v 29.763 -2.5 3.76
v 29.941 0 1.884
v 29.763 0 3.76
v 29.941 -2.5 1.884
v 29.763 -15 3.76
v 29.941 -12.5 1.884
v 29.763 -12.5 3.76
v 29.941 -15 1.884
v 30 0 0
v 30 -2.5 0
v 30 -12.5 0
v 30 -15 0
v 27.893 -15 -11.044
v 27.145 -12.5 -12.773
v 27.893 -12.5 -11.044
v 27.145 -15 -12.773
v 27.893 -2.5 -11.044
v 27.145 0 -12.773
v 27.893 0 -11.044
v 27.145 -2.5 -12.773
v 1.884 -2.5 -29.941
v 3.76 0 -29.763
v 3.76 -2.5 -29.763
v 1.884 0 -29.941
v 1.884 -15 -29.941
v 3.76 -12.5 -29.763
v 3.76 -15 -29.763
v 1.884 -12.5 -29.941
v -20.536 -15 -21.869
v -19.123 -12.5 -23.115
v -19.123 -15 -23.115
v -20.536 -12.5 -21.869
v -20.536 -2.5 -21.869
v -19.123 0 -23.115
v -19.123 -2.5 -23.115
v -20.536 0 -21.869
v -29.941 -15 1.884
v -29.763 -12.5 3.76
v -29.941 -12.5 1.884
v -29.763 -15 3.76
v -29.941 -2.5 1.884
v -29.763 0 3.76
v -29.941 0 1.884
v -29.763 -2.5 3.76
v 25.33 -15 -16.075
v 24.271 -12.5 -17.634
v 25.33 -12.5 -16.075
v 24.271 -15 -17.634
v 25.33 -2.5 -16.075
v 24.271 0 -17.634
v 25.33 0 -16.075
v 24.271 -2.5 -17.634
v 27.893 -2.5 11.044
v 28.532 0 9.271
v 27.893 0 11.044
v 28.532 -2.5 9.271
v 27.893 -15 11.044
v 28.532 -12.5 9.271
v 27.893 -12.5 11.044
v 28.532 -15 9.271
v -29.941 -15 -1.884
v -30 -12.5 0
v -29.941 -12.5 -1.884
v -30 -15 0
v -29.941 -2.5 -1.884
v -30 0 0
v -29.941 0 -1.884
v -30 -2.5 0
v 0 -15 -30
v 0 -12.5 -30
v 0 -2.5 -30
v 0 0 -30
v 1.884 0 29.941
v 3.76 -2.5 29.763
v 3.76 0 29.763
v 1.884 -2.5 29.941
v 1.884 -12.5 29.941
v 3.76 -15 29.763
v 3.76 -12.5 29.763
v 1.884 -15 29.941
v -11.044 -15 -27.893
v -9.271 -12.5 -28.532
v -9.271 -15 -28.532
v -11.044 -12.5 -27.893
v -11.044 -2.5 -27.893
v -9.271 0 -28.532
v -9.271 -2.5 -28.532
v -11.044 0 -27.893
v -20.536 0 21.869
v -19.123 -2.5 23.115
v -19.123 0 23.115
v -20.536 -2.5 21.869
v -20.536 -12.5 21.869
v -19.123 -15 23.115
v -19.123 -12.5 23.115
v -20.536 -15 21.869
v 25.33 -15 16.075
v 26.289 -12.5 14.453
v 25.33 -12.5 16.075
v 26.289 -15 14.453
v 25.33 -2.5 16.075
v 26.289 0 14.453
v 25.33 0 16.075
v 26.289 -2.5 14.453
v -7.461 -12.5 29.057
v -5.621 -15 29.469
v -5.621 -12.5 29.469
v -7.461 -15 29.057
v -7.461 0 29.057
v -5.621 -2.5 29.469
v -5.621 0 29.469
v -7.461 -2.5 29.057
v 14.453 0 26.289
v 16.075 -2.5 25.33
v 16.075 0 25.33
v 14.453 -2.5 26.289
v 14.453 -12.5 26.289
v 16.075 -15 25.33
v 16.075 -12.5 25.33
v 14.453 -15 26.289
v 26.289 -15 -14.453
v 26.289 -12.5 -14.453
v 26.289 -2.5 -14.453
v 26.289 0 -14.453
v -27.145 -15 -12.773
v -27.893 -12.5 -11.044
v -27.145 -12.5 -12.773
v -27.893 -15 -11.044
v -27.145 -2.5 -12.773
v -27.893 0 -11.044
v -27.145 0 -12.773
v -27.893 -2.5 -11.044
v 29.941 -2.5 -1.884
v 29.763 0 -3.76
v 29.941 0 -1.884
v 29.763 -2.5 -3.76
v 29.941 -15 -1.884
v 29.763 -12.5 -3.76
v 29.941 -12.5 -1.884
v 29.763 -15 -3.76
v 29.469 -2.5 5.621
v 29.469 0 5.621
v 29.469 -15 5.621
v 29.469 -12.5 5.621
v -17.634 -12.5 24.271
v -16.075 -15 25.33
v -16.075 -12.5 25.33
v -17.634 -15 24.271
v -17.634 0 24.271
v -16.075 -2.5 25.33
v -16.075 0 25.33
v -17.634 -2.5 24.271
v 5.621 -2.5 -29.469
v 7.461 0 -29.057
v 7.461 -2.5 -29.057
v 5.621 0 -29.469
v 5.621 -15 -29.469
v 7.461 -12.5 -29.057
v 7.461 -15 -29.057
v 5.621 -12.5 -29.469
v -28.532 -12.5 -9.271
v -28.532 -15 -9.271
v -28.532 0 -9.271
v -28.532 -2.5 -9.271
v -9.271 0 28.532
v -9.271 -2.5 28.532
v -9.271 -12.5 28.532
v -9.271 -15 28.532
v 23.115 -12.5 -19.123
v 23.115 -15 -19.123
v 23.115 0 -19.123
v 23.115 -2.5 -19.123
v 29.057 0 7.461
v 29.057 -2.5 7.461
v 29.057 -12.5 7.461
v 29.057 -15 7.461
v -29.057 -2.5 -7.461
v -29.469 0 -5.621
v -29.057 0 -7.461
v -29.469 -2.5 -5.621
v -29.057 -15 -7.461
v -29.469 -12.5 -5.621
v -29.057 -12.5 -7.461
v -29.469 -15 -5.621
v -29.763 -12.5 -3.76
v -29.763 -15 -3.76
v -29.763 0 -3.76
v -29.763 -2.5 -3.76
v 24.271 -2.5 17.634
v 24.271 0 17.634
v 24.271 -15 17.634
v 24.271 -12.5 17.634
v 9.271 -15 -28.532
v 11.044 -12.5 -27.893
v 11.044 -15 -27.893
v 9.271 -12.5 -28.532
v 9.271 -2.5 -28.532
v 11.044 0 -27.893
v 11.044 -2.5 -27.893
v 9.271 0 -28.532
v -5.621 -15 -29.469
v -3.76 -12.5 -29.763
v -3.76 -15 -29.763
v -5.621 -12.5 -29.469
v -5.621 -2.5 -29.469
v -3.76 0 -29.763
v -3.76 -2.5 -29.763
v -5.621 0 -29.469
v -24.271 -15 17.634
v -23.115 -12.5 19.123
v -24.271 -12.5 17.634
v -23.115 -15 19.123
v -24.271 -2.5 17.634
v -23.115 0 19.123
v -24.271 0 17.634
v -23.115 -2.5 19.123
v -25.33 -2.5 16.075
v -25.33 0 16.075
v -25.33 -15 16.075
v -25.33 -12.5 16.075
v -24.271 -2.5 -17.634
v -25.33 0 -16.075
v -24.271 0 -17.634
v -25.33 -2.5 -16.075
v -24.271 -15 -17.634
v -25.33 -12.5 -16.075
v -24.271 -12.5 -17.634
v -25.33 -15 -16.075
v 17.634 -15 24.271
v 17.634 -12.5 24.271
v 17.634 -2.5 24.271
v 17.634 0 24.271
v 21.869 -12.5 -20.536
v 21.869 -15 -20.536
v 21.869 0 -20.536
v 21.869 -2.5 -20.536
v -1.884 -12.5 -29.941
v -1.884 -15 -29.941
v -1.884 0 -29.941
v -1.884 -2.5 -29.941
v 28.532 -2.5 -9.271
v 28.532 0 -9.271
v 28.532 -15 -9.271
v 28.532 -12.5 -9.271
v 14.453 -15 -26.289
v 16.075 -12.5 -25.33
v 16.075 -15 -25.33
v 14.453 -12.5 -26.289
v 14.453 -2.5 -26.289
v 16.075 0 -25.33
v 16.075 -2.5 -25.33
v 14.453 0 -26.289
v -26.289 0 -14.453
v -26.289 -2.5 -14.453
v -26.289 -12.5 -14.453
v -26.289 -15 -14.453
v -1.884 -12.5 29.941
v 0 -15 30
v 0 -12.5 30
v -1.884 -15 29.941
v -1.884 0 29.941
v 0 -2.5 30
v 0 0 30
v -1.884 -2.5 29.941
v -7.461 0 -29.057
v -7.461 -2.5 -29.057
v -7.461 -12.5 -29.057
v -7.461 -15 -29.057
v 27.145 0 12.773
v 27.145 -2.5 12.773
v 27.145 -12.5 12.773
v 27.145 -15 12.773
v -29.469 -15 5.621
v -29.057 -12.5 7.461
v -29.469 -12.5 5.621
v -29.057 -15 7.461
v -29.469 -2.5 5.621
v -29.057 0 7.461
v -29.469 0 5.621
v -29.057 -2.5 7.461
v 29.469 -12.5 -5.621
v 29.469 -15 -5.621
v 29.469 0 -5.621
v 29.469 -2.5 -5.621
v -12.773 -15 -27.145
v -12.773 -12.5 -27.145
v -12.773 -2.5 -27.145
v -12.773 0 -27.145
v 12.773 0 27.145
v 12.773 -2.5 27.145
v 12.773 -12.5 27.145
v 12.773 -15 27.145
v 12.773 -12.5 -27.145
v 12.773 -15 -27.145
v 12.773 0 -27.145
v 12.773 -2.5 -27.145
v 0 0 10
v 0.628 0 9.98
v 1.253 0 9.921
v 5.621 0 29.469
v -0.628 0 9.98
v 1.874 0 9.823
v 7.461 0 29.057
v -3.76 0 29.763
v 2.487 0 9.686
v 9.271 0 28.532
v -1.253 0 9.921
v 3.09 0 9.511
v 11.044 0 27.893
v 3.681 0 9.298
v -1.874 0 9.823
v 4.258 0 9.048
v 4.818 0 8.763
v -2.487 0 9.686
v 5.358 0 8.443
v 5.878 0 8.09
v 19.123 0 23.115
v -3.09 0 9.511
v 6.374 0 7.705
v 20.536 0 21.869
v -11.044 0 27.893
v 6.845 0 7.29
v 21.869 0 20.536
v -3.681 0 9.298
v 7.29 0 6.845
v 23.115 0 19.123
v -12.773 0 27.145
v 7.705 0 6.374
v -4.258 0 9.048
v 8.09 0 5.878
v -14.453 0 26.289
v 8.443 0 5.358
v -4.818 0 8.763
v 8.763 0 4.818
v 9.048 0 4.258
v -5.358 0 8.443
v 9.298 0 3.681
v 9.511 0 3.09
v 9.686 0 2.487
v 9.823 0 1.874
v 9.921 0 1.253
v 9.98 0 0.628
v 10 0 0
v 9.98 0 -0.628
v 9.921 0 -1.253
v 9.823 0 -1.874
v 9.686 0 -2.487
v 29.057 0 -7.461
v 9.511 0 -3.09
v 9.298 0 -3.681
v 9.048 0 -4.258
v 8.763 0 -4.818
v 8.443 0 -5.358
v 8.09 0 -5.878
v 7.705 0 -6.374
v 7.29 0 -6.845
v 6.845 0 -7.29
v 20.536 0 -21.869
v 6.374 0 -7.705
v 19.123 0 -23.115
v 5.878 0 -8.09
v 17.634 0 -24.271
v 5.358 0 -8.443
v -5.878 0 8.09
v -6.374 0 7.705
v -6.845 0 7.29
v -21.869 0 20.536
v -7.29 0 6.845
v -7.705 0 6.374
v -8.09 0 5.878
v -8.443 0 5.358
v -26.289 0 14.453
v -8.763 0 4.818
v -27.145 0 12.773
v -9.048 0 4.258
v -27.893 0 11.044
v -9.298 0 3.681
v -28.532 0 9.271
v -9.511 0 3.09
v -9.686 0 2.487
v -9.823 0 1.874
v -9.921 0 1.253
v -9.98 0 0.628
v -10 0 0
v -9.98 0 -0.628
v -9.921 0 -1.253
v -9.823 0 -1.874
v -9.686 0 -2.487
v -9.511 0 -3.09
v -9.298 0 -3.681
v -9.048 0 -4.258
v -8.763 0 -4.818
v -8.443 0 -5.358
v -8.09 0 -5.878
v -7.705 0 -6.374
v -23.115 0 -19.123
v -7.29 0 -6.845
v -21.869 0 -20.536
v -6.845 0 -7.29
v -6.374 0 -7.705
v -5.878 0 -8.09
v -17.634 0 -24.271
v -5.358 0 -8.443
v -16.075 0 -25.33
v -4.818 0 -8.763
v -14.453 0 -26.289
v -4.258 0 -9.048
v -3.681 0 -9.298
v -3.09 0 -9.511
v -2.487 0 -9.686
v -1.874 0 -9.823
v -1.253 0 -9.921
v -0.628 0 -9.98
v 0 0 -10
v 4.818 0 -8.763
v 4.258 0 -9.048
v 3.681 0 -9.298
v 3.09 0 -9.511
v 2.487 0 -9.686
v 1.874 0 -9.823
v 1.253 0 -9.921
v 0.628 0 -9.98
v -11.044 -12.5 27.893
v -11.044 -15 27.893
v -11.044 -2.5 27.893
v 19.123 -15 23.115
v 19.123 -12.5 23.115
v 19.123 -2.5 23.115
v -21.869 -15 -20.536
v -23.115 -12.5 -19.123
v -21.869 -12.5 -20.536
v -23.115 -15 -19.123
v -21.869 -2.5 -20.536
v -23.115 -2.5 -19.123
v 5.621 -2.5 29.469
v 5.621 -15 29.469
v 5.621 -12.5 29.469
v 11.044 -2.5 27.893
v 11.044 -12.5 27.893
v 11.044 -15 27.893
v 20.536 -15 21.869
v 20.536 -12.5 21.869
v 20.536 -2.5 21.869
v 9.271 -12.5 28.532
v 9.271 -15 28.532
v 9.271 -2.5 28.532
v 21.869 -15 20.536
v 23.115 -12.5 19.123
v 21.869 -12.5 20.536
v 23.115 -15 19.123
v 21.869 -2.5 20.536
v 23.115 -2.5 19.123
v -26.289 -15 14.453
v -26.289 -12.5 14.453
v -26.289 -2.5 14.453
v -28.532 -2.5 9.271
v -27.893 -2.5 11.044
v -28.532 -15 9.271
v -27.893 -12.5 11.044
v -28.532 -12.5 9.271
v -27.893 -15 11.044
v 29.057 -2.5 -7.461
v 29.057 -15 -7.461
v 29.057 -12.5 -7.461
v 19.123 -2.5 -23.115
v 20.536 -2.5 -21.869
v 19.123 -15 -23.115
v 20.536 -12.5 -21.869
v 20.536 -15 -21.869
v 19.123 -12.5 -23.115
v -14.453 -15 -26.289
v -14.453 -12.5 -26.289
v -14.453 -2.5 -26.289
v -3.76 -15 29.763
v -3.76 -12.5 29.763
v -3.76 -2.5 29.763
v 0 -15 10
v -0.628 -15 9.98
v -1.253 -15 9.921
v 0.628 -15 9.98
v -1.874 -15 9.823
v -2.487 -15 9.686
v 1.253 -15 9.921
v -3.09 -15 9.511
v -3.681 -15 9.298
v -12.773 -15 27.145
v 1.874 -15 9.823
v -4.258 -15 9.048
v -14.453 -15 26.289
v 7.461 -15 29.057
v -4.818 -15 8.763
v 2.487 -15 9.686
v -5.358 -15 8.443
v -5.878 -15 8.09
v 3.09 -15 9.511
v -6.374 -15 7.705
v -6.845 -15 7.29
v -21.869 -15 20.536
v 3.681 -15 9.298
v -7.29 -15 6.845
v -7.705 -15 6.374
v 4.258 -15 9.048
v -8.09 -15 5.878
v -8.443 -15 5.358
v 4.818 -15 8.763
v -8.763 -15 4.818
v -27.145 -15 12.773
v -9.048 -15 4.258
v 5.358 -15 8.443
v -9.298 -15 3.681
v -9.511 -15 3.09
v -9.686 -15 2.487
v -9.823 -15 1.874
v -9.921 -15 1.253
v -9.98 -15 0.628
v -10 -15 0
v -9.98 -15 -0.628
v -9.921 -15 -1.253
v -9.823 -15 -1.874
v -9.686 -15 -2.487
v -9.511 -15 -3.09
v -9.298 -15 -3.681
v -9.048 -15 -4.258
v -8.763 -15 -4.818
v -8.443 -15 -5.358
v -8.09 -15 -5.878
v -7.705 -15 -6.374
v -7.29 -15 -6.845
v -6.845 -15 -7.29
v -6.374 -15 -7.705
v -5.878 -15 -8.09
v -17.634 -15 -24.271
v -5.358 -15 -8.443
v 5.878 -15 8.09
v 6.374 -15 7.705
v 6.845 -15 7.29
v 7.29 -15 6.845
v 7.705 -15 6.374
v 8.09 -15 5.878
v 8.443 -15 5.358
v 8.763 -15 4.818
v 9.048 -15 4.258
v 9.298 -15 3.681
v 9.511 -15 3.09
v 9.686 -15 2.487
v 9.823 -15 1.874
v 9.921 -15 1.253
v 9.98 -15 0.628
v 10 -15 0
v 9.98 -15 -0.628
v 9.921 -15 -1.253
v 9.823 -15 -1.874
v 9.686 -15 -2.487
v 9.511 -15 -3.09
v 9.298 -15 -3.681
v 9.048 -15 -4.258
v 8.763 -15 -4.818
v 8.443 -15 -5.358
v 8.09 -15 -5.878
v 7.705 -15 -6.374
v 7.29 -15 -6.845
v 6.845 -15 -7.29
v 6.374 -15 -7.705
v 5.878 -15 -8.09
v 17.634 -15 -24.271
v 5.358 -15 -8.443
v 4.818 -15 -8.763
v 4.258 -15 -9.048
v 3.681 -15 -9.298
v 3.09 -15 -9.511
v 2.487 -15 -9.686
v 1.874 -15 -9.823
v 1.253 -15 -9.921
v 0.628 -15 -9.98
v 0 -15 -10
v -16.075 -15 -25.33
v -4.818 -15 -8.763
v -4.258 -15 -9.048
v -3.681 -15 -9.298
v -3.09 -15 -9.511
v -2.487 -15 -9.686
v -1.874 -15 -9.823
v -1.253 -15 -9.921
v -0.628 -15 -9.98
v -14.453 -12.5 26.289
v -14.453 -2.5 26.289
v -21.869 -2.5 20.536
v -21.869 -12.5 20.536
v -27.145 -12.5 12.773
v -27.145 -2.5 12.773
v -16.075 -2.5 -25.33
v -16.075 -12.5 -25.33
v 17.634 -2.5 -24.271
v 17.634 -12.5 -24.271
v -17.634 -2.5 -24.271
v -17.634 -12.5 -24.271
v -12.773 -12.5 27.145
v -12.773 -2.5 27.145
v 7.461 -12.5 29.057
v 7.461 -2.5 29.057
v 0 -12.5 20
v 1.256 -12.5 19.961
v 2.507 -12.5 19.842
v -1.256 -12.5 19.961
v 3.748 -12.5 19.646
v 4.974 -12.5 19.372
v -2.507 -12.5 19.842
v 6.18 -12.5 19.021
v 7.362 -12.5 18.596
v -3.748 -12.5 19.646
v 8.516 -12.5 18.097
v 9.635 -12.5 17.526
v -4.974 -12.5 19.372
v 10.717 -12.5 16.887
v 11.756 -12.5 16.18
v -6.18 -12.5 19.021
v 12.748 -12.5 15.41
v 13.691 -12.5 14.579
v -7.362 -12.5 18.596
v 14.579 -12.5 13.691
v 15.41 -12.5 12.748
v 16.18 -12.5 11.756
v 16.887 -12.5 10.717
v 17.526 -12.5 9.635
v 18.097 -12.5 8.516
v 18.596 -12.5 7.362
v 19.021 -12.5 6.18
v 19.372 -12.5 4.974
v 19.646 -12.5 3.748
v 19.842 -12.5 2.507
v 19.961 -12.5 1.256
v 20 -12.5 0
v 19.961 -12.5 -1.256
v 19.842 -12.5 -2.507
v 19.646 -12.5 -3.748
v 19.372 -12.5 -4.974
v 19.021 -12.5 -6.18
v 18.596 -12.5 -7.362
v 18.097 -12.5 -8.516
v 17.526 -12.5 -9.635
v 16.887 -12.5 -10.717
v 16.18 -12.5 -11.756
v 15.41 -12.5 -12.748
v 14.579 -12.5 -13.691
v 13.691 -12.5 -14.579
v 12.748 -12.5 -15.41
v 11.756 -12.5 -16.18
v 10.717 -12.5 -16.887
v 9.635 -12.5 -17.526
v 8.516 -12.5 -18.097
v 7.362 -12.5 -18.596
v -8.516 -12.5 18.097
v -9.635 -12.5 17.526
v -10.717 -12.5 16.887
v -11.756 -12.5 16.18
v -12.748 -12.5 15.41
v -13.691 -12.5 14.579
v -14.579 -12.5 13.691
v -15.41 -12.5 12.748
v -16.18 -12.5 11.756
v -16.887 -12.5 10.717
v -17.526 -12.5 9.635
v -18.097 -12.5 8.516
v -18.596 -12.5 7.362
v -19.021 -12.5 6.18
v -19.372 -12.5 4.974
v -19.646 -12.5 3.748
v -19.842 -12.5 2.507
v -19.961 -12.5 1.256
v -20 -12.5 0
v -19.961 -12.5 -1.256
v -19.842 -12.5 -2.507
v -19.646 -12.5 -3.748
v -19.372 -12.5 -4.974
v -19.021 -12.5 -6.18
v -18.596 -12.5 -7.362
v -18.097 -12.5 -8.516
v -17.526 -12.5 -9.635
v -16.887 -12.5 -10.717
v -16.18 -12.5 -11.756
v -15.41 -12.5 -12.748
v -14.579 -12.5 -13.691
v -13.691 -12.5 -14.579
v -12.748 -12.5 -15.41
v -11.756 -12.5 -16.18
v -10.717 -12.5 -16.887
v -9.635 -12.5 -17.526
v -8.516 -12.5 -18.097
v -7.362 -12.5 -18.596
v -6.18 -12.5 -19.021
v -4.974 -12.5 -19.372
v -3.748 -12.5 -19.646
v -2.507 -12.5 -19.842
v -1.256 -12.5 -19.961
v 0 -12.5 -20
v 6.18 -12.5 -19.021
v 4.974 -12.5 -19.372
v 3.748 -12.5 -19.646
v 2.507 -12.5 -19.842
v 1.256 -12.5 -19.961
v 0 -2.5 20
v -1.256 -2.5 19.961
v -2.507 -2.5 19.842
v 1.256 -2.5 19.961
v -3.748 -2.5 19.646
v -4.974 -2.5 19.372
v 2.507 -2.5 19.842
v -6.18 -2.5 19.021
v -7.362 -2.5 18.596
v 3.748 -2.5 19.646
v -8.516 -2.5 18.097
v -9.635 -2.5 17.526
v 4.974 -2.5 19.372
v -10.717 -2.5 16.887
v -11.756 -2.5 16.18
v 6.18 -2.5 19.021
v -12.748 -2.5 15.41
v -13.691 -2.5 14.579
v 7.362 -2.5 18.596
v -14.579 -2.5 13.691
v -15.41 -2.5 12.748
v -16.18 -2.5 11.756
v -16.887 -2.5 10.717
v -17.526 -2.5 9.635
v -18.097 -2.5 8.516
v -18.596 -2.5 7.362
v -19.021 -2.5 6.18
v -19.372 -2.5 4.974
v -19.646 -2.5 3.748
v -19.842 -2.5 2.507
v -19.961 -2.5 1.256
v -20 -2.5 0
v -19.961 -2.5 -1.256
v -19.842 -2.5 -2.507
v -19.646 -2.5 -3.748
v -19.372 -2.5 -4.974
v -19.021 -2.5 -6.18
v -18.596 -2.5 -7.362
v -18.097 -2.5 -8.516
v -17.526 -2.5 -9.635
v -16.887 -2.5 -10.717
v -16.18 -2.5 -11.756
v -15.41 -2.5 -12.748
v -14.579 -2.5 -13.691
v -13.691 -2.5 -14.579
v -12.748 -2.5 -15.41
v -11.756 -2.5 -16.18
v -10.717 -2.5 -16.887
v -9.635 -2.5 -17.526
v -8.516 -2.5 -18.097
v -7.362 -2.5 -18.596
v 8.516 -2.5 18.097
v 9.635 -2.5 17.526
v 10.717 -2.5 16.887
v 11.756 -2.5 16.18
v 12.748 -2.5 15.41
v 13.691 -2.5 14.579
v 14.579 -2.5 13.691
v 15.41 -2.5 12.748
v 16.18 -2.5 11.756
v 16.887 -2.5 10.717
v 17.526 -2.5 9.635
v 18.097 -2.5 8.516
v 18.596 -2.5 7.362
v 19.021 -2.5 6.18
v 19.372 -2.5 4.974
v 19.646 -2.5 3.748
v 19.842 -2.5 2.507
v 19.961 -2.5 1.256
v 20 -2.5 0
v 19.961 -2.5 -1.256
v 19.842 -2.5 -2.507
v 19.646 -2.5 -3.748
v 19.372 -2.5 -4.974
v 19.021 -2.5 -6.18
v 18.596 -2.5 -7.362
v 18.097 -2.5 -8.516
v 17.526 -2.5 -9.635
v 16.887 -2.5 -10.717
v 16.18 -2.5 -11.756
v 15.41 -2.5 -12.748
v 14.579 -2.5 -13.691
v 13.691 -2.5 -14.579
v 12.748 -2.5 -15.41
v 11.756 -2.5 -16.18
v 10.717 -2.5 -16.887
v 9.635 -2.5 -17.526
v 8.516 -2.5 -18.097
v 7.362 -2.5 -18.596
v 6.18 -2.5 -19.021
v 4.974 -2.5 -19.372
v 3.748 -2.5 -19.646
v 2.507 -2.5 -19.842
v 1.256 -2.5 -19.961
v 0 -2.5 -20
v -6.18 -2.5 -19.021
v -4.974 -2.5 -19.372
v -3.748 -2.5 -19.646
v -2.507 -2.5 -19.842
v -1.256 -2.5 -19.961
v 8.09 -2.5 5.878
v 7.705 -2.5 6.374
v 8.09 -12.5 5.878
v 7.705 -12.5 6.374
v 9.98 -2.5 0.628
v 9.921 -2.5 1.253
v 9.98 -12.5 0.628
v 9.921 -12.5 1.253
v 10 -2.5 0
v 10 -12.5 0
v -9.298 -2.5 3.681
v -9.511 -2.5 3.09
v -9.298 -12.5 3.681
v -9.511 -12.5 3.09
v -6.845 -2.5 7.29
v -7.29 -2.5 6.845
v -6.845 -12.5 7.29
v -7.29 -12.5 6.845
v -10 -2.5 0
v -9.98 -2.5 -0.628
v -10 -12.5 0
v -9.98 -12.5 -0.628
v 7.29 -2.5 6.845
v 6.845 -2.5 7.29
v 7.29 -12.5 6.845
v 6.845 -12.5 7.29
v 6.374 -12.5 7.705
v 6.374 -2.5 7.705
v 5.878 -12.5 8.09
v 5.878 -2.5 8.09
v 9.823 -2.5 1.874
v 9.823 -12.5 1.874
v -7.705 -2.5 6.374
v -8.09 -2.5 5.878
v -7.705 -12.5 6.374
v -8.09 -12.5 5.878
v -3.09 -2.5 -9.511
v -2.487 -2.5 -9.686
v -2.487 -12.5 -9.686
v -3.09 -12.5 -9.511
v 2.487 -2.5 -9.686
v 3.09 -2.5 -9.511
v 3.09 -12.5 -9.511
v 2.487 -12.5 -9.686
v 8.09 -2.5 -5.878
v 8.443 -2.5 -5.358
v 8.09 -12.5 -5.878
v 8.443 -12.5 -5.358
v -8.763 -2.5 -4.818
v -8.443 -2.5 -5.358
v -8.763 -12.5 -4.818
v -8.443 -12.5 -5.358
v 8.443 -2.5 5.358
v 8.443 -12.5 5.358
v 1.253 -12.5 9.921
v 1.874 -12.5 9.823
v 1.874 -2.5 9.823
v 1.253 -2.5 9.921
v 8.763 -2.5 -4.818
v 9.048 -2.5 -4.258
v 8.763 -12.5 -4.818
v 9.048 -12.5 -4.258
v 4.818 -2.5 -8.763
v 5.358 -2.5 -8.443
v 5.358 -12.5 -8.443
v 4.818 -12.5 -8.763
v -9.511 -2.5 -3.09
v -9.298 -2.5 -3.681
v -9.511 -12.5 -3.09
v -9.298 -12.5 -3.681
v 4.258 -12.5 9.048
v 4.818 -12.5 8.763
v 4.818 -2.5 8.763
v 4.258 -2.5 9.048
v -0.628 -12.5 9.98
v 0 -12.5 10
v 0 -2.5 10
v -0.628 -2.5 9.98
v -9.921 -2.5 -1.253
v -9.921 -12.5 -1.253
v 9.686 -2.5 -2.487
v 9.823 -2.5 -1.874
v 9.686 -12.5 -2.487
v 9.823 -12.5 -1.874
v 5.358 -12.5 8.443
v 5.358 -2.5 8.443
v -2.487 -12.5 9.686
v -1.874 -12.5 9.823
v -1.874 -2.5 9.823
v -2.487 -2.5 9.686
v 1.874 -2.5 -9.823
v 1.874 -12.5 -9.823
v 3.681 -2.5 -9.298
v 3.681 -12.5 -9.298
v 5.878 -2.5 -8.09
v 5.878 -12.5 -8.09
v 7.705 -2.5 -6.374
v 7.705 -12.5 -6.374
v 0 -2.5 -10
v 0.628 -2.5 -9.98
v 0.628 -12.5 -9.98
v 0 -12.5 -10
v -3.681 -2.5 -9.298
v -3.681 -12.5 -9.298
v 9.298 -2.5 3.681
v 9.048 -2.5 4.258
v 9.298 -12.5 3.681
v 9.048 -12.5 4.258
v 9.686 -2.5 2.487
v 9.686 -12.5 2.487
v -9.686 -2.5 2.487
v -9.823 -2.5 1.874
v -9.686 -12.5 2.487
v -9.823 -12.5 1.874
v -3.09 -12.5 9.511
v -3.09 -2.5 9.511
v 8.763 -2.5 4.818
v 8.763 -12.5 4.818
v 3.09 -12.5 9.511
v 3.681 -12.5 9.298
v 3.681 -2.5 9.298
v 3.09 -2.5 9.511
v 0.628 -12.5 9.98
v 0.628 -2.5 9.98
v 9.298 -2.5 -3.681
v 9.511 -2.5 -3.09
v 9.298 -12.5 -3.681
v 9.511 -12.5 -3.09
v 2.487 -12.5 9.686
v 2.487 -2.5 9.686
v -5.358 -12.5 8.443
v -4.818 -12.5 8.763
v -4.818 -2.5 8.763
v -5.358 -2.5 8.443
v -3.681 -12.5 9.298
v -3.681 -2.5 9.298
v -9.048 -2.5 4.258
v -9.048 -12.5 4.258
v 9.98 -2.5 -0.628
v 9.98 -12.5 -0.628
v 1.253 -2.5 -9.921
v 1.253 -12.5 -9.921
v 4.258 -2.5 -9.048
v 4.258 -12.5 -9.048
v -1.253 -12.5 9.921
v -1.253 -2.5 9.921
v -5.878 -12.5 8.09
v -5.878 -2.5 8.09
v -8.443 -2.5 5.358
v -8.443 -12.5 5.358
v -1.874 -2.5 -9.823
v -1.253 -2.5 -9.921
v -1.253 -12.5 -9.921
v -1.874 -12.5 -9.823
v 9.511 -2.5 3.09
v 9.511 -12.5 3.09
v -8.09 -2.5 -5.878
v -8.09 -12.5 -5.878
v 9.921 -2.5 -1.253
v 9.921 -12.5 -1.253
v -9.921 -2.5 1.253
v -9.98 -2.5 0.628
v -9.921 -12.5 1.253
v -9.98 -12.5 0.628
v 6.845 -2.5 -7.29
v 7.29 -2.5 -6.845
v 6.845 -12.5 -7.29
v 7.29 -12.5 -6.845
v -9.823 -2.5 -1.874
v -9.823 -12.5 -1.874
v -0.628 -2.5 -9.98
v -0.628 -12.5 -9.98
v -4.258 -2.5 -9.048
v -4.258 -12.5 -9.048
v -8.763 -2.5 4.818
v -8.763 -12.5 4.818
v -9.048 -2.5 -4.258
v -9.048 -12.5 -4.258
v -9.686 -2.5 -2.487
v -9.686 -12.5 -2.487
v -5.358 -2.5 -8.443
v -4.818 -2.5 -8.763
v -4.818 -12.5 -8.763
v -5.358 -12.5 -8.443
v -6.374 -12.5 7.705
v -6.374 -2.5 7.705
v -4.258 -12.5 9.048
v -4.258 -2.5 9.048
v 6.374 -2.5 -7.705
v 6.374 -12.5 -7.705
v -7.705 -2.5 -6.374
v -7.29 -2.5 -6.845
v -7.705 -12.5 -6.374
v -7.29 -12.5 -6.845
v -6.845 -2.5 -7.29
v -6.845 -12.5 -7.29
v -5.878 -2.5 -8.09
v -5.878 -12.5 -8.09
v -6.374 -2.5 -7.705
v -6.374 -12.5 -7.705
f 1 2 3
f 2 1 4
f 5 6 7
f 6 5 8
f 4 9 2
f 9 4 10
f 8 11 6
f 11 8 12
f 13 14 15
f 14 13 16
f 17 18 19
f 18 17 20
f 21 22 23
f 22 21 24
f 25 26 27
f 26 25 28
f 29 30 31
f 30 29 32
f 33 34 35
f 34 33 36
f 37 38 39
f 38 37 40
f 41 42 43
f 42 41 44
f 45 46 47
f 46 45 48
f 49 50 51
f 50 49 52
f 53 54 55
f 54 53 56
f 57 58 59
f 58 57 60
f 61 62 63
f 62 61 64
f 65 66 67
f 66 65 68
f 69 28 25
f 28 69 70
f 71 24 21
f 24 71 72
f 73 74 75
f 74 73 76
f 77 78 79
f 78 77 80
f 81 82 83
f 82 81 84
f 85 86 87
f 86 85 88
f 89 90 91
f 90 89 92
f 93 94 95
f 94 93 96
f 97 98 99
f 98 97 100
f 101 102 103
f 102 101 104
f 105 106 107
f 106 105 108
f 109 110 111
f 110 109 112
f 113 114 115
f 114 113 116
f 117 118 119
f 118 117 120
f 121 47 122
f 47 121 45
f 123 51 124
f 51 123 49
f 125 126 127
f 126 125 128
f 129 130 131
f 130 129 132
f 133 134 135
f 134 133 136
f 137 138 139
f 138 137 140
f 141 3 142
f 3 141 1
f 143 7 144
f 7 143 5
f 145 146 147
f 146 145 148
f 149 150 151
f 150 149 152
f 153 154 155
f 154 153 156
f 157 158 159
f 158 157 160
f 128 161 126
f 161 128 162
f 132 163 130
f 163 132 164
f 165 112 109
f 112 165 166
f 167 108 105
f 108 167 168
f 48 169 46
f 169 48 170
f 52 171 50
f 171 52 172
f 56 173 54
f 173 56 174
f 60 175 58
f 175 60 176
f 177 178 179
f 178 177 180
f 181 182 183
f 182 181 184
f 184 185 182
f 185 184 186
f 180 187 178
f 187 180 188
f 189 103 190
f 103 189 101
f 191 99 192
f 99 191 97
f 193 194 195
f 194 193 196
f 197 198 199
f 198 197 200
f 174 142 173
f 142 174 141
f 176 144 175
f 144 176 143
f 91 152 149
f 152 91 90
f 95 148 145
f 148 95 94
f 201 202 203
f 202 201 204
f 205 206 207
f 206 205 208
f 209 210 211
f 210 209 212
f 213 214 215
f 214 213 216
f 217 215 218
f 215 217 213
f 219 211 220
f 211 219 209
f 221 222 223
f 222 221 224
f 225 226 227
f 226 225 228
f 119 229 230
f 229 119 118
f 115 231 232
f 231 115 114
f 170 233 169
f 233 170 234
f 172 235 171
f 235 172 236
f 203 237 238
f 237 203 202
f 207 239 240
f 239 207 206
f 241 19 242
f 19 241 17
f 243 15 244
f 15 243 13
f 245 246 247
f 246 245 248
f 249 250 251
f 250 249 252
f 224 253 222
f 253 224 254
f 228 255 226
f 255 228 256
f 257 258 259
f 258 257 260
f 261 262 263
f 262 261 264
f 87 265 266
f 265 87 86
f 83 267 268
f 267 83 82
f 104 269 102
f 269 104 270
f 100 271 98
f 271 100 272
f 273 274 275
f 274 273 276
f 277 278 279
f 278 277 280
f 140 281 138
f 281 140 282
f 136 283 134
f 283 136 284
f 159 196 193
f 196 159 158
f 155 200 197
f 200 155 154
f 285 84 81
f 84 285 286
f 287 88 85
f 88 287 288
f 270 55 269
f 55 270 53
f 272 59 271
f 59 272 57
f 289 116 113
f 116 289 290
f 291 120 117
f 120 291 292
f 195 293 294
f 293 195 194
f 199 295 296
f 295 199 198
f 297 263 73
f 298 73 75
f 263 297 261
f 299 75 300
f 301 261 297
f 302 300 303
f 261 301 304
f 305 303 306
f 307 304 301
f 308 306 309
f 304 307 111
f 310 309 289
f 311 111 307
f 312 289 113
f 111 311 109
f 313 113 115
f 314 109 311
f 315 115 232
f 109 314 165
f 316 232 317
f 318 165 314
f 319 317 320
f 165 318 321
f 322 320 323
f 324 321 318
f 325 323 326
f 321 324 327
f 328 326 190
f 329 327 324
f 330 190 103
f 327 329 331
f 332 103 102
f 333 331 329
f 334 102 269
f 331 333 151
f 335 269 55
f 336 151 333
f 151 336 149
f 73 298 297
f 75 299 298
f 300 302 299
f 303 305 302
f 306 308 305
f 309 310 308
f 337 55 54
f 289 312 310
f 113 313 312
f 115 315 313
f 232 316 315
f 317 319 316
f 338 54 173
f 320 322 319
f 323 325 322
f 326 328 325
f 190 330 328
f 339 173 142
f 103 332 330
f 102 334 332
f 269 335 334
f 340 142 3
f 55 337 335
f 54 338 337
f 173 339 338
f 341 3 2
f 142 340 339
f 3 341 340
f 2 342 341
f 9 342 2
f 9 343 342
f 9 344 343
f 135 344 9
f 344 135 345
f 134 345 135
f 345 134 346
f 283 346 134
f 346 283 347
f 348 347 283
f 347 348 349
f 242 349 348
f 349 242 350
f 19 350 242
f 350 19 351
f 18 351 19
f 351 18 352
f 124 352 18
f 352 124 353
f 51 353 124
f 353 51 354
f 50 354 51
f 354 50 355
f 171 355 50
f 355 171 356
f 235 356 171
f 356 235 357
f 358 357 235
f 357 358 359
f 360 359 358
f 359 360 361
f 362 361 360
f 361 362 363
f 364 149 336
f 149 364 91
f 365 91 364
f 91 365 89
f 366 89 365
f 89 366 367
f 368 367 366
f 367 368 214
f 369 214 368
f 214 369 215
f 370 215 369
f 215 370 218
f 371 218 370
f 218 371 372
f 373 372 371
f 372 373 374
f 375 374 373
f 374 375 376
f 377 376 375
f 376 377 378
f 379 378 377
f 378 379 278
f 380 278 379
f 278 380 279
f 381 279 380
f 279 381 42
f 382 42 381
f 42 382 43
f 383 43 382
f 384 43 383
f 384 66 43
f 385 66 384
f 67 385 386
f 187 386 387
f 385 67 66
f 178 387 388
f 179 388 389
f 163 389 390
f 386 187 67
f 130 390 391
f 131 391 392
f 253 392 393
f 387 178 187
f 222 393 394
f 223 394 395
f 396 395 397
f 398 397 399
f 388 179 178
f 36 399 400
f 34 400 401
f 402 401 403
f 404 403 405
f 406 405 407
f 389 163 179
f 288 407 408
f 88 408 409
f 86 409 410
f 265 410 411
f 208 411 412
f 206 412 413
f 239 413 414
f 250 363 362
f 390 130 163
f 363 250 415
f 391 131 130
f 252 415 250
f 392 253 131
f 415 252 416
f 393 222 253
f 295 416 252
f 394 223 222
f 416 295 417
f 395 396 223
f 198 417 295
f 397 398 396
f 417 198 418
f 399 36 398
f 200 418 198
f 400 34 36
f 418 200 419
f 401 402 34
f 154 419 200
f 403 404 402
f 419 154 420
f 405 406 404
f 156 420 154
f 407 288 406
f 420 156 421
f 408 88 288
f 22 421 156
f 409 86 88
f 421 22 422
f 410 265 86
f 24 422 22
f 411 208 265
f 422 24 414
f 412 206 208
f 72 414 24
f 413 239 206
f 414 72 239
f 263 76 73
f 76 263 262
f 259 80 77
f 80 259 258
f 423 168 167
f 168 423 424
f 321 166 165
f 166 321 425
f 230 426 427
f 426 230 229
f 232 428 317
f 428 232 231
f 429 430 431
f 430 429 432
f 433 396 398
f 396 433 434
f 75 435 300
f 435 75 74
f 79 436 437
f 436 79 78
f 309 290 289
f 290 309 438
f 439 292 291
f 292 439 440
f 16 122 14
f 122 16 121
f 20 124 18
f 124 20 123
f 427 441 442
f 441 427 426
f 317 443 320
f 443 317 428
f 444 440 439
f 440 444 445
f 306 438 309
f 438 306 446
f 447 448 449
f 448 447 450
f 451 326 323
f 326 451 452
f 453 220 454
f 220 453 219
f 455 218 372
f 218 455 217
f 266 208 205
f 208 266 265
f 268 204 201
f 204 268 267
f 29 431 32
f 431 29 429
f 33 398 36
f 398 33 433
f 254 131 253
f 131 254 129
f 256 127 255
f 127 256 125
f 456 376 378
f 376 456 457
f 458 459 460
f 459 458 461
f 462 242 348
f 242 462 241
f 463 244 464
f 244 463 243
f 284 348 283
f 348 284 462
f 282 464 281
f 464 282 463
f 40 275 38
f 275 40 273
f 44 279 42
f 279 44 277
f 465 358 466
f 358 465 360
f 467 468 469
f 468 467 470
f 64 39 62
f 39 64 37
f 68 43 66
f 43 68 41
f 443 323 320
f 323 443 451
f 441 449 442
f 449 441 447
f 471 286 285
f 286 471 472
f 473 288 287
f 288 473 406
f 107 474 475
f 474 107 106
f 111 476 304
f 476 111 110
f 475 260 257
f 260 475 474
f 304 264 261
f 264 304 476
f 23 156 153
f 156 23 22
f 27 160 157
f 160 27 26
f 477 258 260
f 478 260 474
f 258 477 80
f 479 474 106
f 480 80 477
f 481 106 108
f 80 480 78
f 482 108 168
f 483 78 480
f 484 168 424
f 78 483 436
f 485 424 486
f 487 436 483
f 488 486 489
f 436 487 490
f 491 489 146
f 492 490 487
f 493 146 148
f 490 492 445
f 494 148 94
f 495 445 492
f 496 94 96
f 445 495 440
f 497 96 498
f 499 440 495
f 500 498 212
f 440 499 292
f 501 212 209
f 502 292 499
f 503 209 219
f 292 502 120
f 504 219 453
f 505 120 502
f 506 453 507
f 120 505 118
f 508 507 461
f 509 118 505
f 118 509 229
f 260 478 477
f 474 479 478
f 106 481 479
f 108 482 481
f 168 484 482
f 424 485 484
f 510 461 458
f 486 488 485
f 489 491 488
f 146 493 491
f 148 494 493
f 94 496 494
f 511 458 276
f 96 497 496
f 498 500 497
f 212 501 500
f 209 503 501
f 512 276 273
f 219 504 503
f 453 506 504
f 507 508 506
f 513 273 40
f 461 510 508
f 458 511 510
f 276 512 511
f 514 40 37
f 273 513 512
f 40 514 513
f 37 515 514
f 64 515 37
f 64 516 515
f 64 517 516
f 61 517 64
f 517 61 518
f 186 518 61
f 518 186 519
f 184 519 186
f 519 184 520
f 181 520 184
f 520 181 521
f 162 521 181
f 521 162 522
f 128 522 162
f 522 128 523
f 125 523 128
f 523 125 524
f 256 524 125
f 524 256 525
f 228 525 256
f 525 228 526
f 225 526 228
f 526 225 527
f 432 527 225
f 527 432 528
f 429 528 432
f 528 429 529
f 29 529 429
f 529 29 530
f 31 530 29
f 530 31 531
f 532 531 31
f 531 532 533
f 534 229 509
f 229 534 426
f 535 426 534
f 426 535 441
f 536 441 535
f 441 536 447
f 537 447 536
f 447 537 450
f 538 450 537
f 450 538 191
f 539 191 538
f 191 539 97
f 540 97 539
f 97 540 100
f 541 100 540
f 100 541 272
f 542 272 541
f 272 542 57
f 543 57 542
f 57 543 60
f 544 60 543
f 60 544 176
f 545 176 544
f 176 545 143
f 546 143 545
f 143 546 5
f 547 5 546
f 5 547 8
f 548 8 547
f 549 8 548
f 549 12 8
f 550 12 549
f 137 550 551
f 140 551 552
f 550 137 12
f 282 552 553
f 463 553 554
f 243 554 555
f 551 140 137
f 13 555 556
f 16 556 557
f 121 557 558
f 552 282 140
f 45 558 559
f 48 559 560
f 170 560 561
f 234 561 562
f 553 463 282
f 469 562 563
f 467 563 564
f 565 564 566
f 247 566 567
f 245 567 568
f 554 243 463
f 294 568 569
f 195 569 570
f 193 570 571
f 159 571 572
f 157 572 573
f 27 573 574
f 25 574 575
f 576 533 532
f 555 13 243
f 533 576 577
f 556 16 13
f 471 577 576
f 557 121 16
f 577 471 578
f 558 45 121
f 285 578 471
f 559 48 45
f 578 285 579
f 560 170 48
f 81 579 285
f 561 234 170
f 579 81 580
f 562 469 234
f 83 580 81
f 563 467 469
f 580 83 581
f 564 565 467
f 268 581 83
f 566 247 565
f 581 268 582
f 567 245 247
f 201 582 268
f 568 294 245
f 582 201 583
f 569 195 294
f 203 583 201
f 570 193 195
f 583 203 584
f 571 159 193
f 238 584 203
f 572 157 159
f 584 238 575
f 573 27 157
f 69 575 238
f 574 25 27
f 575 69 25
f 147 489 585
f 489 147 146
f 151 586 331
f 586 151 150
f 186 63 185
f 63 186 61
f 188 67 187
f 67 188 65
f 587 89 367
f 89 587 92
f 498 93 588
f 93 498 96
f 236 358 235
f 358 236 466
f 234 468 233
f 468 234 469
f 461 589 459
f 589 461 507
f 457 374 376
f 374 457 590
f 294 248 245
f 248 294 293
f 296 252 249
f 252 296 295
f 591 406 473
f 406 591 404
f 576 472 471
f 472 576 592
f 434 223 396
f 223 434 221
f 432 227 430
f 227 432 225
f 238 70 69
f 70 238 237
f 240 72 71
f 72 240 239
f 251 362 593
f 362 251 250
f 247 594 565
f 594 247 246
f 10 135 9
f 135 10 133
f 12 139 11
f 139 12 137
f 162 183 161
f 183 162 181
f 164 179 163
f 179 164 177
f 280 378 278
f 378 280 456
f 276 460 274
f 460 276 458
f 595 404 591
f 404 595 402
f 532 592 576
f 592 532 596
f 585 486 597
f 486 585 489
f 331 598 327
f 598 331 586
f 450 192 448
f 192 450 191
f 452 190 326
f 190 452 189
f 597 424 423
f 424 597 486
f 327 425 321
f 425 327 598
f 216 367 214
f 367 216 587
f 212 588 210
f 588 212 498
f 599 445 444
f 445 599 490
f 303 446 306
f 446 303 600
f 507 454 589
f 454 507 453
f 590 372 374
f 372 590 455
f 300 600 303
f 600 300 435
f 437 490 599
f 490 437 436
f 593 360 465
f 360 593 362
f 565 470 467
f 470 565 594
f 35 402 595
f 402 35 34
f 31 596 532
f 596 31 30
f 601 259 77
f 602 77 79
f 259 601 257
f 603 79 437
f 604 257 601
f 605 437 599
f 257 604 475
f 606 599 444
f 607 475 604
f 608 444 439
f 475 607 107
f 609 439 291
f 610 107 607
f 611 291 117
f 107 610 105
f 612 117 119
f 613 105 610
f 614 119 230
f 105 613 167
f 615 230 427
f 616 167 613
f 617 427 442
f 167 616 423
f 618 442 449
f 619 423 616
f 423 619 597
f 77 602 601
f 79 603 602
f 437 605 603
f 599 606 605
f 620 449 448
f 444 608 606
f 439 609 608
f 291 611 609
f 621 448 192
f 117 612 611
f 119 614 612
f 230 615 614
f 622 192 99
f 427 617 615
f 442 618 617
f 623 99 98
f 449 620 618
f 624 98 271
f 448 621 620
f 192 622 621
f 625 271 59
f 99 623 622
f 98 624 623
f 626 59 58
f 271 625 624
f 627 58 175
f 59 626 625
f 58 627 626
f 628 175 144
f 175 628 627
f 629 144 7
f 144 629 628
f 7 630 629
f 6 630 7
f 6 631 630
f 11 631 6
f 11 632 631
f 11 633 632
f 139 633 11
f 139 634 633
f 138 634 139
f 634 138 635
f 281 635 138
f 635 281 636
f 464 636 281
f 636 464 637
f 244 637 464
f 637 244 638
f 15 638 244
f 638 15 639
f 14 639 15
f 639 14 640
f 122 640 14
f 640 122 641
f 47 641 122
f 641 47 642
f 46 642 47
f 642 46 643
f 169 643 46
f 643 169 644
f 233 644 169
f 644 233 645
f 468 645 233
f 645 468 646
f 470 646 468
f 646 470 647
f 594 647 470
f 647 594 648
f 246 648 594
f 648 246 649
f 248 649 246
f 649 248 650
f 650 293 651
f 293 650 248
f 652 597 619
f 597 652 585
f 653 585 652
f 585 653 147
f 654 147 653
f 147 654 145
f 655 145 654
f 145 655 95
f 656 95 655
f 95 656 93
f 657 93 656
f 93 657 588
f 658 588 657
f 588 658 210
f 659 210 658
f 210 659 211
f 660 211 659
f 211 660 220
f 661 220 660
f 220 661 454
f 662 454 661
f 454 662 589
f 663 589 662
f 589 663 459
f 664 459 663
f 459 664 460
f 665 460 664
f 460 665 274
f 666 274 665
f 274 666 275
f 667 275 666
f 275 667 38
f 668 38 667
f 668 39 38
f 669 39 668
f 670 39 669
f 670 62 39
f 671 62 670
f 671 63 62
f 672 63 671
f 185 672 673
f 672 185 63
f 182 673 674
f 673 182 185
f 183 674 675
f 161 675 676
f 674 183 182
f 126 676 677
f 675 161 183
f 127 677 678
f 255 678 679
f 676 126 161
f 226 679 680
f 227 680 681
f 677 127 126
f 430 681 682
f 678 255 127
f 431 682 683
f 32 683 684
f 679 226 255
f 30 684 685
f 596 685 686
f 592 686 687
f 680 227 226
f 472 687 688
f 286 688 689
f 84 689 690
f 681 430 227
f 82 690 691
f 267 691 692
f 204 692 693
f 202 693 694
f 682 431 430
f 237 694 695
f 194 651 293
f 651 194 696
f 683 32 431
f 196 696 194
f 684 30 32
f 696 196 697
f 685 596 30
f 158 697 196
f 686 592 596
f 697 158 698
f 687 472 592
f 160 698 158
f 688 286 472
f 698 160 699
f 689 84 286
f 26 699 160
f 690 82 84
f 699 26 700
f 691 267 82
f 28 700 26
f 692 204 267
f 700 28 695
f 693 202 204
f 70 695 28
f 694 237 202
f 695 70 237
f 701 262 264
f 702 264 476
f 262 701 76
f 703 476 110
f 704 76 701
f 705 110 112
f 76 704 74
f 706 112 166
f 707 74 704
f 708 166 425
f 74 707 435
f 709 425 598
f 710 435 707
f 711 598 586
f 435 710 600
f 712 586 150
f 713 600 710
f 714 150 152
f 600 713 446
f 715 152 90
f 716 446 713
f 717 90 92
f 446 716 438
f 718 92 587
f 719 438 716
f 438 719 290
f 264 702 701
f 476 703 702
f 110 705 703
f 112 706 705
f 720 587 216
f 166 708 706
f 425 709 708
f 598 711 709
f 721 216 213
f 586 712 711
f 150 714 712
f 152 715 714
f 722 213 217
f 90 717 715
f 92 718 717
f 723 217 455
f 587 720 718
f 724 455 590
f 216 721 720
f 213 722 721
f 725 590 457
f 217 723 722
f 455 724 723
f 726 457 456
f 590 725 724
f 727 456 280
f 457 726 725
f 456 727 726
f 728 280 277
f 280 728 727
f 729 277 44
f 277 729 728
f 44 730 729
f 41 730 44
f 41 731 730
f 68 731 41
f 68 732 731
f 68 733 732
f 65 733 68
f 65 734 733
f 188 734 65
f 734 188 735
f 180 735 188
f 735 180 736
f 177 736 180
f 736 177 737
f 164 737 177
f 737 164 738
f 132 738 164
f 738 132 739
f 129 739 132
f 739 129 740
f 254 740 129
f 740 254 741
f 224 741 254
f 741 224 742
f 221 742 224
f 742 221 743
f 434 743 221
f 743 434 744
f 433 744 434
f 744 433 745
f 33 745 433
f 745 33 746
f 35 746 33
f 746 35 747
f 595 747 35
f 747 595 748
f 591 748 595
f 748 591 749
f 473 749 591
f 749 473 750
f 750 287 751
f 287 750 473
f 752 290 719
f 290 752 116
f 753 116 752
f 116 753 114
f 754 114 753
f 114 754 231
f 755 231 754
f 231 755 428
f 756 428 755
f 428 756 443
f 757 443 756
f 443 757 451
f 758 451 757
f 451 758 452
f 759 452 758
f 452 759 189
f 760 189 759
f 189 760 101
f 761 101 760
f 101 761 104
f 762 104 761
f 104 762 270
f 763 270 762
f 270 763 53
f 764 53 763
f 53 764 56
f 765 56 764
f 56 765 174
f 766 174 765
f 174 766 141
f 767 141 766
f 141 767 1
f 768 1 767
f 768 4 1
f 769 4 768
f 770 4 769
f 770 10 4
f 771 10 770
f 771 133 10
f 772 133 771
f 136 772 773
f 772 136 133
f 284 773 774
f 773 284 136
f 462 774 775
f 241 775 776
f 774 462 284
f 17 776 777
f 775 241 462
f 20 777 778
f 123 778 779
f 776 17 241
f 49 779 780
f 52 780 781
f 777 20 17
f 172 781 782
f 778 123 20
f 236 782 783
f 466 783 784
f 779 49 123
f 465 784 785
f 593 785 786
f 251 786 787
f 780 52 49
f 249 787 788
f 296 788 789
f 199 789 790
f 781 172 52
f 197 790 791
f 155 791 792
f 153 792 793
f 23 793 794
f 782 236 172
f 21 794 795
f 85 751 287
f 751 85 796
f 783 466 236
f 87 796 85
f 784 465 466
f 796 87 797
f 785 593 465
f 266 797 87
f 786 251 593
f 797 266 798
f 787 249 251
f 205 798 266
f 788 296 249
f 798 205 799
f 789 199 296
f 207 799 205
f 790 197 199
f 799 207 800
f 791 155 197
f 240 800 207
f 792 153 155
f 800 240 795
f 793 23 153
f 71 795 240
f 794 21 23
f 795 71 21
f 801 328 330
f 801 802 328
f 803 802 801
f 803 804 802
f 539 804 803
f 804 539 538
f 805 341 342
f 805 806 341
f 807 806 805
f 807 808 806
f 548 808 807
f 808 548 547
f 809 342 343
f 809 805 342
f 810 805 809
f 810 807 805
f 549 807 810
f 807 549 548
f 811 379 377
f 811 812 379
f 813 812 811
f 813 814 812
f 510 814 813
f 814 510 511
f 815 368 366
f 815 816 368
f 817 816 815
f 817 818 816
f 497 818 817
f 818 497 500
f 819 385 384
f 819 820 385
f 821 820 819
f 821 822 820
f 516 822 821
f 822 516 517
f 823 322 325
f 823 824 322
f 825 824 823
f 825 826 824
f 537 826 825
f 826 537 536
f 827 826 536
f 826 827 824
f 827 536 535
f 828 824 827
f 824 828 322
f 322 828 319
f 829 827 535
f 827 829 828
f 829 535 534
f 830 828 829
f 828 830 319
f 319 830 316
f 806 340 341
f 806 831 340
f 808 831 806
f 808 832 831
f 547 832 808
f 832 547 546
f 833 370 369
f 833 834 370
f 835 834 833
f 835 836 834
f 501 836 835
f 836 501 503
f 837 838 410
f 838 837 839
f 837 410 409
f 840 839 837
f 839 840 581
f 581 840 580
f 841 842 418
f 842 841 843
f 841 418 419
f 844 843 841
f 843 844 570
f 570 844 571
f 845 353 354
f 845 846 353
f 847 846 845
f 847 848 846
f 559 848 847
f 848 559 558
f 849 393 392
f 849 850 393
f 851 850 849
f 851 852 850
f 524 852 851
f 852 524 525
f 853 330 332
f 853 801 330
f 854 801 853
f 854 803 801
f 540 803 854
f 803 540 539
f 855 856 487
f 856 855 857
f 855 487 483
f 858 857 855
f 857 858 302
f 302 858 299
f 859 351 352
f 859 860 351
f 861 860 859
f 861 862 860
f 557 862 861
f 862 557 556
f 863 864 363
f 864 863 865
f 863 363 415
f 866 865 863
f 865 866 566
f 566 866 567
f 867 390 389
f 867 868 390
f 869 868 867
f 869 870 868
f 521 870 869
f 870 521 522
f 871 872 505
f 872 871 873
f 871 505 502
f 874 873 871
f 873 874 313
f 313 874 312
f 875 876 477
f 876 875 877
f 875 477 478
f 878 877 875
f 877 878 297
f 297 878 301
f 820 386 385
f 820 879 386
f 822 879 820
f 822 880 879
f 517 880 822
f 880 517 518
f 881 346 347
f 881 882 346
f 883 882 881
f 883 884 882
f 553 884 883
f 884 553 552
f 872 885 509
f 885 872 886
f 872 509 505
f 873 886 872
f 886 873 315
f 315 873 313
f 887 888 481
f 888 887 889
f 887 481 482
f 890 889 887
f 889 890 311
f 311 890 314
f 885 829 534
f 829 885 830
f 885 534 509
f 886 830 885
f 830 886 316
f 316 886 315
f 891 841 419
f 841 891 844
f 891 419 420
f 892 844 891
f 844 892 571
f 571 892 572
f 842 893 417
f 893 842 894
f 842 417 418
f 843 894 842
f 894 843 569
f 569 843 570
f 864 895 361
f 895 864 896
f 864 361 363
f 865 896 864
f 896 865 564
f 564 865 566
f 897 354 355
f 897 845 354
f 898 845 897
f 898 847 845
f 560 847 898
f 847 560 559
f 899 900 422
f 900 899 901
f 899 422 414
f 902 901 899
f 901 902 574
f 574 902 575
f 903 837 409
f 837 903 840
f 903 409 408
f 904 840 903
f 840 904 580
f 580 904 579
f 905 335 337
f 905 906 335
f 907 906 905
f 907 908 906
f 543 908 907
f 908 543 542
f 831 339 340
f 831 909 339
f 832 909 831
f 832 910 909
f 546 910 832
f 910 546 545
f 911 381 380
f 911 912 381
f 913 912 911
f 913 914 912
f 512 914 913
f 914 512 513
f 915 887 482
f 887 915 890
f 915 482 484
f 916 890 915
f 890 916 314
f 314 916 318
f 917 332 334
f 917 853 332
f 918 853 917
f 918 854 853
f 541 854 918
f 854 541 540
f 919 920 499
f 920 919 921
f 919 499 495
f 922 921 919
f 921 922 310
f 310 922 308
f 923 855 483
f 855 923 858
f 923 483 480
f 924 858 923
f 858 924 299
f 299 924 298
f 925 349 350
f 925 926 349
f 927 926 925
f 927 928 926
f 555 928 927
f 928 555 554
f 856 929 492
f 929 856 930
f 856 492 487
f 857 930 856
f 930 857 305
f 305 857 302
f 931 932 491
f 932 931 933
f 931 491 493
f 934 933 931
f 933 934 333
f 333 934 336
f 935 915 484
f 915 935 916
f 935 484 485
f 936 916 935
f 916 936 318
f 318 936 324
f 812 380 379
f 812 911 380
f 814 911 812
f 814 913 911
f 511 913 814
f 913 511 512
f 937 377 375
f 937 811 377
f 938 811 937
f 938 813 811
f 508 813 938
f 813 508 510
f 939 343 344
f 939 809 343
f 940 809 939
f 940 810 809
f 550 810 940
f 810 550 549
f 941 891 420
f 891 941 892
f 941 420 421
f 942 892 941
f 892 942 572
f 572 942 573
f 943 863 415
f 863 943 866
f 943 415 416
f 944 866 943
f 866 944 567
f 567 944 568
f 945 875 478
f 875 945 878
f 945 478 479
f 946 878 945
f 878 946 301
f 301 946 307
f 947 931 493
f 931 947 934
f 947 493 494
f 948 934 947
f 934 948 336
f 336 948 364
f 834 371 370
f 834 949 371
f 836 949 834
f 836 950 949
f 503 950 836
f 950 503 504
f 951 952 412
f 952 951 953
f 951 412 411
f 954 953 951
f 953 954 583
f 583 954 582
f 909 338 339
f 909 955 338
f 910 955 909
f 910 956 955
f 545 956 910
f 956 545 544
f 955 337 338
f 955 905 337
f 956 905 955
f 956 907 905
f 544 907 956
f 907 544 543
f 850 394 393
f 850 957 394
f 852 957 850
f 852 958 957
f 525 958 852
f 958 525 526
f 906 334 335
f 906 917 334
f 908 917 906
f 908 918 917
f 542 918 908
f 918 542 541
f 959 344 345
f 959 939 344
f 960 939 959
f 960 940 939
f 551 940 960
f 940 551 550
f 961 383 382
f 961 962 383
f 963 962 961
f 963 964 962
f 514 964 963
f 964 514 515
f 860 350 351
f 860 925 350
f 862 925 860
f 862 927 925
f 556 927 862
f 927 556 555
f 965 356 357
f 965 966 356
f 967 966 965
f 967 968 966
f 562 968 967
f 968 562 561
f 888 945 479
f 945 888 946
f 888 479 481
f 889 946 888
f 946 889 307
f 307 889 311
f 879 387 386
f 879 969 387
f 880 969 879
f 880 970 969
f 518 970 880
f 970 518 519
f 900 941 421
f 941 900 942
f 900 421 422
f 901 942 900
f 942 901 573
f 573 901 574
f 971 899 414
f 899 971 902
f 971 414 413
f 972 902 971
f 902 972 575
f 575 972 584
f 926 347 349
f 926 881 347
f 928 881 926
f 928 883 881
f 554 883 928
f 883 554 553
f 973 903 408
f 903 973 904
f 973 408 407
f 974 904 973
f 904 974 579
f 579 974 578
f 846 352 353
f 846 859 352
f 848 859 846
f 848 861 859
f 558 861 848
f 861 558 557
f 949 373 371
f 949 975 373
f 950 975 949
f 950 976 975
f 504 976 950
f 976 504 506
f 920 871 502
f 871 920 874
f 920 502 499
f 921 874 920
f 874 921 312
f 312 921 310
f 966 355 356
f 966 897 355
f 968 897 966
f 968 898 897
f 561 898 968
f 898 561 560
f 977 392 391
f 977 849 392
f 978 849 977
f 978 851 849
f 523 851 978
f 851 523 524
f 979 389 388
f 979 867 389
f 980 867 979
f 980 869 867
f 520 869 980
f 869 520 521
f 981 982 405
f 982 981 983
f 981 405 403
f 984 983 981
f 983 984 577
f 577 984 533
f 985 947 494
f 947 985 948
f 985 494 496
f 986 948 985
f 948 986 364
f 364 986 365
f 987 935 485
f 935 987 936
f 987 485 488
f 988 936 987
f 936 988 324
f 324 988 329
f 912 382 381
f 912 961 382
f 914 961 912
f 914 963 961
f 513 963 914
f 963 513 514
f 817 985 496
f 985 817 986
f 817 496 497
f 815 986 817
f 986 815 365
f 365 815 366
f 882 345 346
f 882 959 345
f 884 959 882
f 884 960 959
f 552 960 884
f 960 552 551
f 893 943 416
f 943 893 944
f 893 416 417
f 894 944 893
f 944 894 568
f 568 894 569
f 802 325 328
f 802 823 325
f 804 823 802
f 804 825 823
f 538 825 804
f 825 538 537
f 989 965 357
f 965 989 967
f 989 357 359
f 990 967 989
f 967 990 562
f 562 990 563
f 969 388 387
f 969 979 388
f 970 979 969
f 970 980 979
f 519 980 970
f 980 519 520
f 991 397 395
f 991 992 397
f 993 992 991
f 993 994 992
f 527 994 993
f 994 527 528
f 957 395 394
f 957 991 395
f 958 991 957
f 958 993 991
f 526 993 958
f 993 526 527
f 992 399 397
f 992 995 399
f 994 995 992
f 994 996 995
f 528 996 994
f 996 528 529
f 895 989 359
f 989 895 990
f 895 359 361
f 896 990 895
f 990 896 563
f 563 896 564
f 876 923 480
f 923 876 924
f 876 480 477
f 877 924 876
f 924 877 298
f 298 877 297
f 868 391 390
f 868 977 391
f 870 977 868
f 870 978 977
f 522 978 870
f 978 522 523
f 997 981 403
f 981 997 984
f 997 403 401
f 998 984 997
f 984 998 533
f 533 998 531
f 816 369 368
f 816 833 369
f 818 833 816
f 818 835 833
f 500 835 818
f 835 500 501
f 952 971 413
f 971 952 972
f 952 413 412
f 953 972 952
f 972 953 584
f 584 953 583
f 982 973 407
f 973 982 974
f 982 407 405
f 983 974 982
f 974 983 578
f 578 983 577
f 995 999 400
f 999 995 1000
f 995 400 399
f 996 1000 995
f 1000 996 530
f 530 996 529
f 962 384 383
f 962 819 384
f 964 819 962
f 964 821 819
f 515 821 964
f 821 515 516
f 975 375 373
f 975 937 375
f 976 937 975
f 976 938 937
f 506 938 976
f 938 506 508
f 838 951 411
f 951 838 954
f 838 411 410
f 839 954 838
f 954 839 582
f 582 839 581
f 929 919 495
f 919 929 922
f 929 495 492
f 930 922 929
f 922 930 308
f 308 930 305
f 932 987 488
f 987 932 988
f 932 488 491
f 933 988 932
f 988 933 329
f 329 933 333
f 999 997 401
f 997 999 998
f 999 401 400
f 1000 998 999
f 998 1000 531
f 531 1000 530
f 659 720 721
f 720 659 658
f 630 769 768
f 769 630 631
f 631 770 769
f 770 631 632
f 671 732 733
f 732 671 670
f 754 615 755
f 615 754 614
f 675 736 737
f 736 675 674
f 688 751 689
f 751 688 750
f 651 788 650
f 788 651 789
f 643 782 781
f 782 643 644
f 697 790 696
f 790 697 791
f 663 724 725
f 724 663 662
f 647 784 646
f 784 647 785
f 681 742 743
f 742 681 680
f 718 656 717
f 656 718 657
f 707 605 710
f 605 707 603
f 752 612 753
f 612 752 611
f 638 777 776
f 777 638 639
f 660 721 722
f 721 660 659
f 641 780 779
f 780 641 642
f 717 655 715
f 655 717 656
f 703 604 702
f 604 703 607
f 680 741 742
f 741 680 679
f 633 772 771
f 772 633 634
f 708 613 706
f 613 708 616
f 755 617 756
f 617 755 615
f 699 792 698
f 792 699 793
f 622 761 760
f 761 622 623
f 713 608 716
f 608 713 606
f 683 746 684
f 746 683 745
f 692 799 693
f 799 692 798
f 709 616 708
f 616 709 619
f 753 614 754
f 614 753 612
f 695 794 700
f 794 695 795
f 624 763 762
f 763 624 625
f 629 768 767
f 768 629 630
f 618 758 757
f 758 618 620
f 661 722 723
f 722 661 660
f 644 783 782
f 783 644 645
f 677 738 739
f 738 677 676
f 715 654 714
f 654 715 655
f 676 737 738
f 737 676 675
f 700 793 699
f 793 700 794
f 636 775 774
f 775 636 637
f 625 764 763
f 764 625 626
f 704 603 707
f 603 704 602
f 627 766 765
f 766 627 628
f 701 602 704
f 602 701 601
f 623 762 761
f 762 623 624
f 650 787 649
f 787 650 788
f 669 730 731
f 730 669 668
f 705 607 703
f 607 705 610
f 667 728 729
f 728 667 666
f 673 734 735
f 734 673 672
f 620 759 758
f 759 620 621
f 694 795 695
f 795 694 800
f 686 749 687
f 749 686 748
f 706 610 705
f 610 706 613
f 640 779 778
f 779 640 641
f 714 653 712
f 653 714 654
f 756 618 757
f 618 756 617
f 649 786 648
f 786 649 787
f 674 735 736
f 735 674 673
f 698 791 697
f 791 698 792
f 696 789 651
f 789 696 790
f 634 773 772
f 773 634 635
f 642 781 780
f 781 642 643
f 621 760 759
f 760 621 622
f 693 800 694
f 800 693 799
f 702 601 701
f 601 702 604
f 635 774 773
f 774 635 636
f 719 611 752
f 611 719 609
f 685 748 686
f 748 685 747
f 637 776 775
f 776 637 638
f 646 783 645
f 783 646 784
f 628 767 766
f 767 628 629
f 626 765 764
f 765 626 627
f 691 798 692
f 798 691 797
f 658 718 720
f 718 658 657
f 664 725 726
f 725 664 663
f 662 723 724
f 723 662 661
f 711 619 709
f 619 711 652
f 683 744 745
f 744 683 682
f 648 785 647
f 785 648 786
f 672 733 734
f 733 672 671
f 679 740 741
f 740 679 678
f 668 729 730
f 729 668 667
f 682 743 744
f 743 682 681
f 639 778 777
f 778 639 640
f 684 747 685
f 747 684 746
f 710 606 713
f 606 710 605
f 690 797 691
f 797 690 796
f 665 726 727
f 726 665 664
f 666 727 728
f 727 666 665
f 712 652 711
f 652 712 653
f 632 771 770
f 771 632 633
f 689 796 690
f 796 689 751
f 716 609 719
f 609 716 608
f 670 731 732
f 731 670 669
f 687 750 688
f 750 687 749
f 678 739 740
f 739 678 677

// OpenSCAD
$fn=100;
h=15; //высота
L=30; //радиус
g=20; //глубина котушки
difference () {
rotate ([90,0,0])cylinder (h,L,L);
rotate ([90,0,0])translate ([0,0,2.5])cylinder (h-5,L+1,L+1);
translate ([0,10,0])rotate ([90,0,0])cylinder (100,10,10);
}
//подшипник
difference () {
rotate ([90,0,0])cylinder (h,g,g);
translate ([0,10,0])rotate ([90,0,0])cylinder (100,10,10);
}
